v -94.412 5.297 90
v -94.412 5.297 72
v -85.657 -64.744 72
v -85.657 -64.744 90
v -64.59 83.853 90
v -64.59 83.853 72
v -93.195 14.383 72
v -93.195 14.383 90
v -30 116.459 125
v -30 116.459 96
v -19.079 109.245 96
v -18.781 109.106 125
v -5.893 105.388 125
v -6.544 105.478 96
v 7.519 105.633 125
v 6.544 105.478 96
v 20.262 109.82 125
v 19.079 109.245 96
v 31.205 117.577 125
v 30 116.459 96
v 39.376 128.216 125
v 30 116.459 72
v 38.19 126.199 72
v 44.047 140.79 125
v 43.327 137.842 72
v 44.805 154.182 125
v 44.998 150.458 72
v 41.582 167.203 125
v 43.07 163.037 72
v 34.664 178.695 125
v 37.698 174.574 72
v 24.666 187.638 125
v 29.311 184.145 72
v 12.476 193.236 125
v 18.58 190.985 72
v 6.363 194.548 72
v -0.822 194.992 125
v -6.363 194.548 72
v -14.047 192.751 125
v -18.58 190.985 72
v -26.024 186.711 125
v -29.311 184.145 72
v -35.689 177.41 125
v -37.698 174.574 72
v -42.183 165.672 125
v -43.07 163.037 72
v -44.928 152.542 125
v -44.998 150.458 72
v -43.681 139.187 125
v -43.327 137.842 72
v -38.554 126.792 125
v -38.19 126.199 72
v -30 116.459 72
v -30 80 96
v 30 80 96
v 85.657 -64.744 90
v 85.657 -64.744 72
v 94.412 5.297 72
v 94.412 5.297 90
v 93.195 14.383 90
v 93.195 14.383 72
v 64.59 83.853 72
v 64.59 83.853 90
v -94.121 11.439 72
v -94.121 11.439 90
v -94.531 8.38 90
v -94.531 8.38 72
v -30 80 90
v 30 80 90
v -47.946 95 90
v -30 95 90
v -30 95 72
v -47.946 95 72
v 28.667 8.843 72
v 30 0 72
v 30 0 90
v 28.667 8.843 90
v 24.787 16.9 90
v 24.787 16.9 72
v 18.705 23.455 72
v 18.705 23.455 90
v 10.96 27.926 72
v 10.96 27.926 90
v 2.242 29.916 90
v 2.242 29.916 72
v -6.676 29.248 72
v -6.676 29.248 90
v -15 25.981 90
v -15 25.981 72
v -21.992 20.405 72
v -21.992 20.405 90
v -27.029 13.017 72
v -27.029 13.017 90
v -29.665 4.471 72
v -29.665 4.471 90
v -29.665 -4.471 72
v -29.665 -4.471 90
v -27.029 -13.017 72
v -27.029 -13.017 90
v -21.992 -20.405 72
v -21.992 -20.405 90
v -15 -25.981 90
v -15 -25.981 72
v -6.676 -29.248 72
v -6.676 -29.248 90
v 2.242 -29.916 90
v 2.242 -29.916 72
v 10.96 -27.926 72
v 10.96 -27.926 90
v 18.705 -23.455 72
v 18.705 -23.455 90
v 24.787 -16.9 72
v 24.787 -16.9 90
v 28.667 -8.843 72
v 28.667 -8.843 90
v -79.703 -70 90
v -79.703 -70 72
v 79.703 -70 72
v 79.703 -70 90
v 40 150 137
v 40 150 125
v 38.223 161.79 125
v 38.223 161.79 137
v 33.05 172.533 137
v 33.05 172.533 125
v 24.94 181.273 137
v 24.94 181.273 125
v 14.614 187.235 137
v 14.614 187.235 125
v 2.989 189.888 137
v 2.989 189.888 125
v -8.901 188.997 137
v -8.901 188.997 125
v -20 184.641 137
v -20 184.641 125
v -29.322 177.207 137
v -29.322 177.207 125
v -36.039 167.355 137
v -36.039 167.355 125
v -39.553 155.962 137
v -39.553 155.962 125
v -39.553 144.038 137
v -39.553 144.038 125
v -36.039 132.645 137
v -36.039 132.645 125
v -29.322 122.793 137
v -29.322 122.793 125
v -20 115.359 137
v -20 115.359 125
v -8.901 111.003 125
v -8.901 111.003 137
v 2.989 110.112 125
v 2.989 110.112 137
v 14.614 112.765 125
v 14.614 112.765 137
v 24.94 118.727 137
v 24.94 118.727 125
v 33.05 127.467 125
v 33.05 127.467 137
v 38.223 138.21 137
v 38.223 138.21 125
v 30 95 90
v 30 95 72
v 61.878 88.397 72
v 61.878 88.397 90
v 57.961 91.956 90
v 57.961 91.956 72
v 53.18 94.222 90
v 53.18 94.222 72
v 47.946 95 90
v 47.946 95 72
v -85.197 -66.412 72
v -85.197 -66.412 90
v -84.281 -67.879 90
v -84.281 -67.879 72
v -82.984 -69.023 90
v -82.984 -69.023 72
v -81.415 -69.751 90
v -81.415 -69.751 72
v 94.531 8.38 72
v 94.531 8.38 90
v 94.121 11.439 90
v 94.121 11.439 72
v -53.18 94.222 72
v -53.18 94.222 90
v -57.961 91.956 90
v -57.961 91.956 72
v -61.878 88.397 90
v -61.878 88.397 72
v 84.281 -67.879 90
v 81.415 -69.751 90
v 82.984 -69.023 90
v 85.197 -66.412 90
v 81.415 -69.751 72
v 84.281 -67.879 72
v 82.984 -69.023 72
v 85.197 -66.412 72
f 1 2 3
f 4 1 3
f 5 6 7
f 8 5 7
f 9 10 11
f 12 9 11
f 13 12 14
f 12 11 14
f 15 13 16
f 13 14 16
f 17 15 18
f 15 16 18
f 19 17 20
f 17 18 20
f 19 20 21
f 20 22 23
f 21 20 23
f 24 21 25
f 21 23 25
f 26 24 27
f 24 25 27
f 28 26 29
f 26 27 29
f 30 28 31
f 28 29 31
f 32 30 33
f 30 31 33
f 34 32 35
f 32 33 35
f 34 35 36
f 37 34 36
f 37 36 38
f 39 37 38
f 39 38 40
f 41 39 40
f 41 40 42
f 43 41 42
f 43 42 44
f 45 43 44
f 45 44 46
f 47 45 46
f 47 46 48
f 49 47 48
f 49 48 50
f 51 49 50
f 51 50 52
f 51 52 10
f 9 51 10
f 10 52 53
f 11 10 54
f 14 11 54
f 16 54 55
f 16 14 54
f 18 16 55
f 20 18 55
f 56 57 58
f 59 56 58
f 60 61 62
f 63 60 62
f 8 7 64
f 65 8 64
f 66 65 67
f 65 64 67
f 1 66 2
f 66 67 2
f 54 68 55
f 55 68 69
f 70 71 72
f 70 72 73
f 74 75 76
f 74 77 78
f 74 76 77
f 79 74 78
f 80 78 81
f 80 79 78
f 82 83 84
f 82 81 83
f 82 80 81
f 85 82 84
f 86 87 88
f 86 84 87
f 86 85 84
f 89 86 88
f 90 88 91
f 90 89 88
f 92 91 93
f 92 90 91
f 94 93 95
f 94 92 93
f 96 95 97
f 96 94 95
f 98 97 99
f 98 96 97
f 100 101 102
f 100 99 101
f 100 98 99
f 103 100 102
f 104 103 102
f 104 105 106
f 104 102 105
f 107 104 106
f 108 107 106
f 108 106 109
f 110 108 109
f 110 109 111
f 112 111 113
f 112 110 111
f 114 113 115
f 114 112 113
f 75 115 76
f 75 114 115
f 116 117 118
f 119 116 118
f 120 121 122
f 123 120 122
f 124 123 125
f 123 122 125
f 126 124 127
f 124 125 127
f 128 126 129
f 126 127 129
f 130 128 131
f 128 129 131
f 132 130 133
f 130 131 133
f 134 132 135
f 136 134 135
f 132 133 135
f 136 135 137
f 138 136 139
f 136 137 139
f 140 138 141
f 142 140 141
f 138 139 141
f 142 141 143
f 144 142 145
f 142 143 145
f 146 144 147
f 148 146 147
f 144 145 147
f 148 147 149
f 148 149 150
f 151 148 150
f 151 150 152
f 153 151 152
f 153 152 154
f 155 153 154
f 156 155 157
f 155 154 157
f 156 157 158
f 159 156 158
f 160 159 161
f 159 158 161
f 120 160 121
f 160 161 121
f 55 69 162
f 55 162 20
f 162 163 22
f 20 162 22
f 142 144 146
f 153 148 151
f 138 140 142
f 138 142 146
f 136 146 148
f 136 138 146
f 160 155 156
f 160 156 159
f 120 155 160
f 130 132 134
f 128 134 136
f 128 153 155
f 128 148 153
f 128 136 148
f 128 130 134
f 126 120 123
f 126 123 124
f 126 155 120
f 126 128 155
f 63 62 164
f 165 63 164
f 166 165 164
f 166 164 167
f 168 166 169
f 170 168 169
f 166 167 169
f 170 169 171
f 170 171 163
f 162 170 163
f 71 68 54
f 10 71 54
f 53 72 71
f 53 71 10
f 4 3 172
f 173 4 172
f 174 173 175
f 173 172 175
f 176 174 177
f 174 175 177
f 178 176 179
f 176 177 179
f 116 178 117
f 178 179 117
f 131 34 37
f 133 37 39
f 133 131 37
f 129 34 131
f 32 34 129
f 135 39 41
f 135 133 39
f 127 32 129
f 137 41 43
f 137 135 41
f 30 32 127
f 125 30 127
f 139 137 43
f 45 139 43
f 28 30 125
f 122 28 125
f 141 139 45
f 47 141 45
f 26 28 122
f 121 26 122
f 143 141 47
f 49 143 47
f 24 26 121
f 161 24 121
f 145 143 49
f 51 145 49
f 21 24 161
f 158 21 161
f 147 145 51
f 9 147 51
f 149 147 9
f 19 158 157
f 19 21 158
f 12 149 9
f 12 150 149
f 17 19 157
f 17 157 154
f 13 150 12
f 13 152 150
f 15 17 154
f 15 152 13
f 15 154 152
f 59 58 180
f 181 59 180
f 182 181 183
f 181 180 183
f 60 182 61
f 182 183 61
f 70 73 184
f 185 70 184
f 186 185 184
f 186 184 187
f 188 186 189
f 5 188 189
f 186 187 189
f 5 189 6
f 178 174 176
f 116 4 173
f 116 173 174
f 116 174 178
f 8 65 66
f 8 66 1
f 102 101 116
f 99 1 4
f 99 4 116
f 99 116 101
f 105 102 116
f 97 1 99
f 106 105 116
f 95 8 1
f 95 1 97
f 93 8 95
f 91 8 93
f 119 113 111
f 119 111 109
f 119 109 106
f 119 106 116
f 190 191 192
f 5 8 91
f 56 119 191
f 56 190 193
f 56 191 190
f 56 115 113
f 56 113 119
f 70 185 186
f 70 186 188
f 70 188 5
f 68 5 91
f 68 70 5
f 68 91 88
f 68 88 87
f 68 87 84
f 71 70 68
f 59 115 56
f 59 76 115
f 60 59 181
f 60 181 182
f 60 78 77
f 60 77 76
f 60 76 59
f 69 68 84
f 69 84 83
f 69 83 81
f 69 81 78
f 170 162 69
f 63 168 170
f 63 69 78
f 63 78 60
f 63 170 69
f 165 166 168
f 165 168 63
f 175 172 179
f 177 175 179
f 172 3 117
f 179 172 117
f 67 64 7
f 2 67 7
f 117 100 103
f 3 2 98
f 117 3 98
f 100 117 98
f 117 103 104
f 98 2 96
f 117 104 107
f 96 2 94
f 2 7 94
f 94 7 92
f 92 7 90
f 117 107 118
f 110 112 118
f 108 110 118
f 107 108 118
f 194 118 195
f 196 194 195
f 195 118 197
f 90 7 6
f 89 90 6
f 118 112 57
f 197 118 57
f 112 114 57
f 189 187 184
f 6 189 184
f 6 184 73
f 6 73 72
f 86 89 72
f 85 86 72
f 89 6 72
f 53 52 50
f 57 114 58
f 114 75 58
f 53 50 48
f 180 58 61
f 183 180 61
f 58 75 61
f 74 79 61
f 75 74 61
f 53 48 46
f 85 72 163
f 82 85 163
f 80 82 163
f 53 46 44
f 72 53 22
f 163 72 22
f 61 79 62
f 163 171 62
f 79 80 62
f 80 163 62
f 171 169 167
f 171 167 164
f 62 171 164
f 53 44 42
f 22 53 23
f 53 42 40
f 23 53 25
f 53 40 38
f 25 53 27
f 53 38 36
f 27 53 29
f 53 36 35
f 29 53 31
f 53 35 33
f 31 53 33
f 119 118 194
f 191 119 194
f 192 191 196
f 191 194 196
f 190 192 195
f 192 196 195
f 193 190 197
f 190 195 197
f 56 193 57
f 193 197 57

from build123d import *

# Parameters (mm, degrees)
COVER_START          = 72
COVER_DEPTH          = 18
PUMP_START           = 72
SKETCH2_W            = 60
SKETCH2_H            = 70
PUMP_WEB_DEPTH       = 24
WATER_START          = 72
SKETCH3_R            = 45
WATER_PUMP_DEPTH     = 53
PUMP_START_2         = 125
SKETCH4_R            = 40
PUMP_PULLEY_DEPTH    = 12
SEAL_BORE_DEPTH      = 257.38624879
SEAL_BORE_DEPTH_BACK = 257.38624879
SKETCH5_R            = 30


with BuildPart() as part:
    # Sketch1 → Cover (new body)
    with BuildSketch(Plane.XY.offset(COVER_START)):
        with BuildLine():
            Line((-79.703306689, -70), (79.703306689, -70))
            ThreePointArc((79.703306689, -70), (83.674122068, -68.498069055), (85.656973949, -64.744208408))
            Line((85.656973949, -64.744208408), (94.412091509, 5.296732068))
            ThreePointArc((94.412091509, 5.296732068), (94.391822309, 9.918554009), (93.1952955, 14.382853785))
            Line((93.1952955, 14.382853785), (64.589736738, 83.853496495))
            ThreePointArc((64.589736738, 83.853496495), (57.96144488, 91.955984369), (47.945530965, 95))
            Line((47.945530965, 95), (-47.945530965, 95))
            ThreePointArc((-47.945530965, 95), (-57.96144488, 91.955984369), (-64.589736738, 83.853496495))
            Line((-64.589736738, 83.853496495), (-93.1952955, 14.382853785))
            ThreePointArc((-93.1952955, 14.382853785), (-94.391822309, 9.918554009), (-94.412091509, 5.296732068))
            Line((-94.412091509, 5.296732068), (-85.656973949, -64.744208408))
            ThreePointArc((-85.656973949, -64.744208408), (-83.674122068, -68.498069055), (-79.703306689, -70))
        make_face()
    extrude(amount=COVER_DEPTH)

    # Sketch2 → Pump Web (add)
    with BuildSketch(Plane.XY.offset(PUMP_START)):
        with Locations((0, 115)):
            Rectangle(SKETCH2_W, SKETCH2_H)
    extrude(amount=PUMP_WEB_DEPTH)

    # Sketch3 → Water Pump (add)
    with BuildSketch(Plane.XY.offset(WATER_START)):
        with Locations(Location((0, 150, 0), (0, 0, 228.189685104))):
            Circle(SKETCH3_R)
    extrude(amount=WATER_PUMP_DEPTH)

    # Sketch4 → Pump Pulley (add)
    with BuildSketch(Plane.XY.offset(PUMP_START_2)):
        with Locations((0, 150)):
            Circle(SKETCH4_R)
    extrude(amount=PUMP_PULLEY_DEPTH)

    # Sketch5 → Seal Bore (cut, two sides: drawn at the far end of the back side and taken through both)
    with BuildSketch(Plane.XY.offset(-SEAL_BORE_DEPTH_BACK)):
        Circle(SKETCH5_R)
    extrude(amount=SEAL_BORE_DEPTH + SEAL_BORE_DEPTH_BACK, mode=Mode.SUBTRACT)


solid = part.part
